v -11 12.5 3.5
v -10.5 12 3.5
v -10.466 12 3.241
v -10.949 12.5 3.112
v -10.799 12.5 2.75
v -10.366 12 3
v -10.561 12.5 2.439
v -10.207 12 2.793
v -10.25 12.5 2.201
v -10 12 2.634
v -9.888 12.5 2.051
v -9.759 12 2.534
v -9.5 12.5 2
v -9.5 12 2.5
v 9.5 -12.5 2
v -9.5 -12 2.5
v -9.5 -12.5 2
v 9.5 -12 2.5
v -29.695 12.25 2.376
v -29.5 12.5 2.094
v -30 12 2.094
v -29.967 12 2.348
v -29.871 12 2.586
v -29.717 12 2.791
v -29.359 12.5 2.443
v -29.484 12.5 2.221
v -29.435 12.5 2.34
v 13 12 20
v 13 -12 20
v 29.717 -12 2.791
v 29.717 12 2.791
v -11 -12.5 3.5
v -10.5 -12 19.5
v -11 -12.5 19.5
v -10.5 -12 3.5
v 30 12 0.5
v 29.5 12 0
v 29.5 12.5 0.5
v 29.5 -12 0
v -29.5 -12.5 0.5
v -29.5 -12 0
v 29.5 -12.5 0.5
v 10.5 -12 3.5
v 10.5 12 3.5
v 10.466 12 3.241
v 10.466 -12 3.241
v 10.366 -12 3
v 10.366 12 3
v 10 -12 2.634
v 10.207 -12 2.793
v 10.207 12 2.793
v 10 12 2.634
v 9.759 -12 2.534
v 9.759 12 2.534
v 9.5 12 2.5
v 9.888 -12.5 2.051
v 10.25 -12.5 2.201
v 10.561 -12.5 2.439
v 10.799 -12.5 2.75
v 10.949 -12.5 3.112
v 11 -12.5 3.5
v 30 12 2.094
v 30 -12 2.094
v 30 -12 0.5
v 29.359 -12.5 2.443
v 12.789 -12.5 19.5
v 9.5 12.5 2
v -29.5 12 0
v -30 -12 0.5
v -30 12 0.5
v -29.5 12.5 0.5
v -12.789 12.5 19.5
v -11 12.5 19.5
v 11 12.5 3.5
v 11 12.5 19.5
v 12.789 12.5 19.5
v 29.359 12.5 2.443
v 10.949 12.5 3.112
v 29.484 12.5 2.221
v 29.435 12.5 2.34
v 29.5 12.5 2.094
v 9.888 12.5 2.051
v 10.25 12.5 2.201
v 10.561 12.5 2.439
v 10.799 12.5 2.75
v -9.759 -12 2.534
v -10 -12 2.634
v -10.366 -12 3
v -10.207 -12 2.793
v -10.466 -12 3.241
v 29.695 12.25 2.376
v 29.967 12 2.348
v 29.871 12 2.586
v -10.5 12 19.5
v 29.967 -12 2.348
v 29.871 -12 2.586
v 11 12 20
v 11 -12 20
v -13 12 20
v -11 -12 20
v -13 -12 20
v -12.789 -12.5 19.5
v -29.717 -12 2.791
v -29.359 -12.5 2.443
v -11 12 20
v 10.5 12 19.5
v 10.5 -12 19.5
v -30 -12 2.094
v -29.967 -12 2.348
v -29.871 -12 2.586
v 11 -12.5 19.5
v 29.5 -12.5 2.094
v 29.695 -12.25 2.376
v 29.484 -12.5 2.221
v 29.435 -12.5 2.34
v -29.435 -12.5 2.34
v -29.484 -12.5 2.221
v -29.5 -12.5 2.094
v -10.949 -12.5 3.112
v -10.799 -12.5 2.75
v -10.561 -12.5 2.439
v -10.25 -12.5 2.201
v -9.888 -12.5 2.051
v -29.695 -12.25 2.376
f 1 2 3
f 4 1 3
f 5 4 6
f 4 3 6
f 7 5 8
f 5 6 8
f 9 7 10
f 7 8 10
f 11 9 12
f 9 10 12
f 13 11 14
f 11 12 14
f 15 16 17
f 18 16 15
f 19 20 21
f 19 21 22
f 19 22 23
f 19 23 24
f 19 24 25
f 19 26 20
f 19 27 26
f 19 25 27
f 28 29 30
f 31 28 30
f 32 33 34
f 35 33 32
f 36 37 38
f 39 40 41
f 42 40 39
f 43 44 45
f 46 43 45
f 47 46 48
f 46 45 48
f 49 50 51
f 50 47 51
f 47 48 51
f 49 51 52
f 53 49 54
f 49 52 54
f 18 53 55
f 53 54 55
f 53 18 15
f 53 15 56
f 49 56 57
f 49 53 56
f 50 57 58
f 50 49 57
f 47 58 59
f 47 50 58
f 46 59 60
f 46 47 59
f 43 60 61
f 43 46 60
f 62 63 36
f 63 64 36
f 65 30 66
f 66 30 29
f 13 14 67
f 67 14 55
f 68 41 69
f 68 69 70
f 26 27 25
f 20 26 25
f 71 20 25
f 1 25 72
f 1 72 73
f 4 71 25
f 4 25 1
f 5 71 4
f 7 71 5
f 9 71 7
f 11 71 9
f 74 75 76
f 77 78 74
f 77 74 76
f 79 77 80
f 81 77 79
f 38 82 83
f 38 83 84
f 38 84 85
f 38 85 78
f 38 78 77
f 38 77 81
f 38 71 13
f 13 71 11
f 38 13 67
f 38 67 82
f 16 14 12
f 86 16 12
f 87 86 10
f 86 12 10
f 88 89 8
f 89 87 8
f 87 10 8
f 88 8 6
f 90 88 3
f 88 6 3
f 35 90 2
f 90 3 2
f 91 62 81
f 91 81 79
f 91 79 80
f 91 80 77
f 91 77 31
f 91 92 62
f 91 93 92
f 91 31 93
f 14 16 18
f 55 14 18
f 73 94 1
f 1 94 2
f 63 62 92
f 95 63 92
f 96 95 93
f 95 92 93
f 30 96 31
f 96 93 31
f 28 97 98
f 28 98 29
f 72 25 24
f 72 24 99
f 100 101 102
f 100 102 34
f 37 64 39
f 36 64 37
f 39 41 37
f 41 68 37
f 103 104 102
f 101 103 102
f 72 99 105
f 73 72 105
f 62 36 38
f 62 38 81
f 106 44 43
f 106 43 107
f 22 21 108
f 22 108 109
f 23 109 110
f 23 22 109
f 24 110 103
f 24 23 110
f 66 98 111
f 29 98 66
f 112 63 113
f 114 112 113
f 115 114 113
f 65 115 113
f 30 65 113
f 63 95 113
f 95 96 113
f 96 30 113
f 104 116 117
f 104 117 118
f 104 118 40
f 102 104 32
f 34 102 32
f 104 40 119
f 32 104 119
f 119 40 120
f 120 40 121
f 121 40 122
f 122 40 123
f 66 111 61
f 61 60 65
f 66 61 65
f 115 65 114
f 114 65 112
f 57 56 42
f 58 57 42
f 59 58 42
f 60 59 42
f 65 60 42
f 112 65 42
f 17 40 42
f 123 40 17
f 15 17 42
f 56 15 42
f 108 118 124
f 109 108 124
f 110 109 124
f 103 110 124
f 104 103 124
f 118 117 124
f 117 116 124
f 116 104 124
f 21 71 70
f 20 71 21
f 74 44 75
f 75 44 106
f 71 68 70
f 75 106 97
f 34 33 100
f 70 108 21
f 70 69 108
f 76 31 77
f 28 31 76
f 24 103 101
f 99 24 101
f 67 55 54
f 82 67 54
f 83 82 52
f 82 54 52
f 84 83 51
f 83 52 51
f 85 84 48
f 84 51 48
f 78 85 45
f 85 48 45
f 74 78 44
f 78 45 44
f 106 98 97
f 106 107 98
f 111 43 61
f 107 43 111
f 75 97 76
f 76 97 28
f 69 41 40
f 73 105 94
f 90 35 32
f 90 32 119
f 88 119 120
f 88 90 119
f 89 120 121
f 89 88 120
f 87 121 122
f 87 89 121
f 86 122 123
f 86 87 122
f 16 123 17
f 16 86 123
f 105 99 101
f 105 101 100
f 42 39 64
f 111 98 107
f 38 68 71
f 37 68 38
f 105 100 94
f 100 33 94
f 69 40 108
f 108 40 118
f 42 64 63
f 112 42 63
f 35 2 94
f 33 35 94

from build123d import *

# Parameters (mm, degrees)
F0_W     = 60
F0_H     = 25
F1_DEPTH = 20
F2_W     = 21
F2_H     = 17.5
F3_DEPTH = 25.001
F4_R     = 1
F5_SIZE  = 0.5


with BuildPart() as f1:
    # F0 (on Top) → F1 (new body)
    with BuildSketch(Plane.XY):
        Rectangle(F0_W, F0_H)
    extrude(amount=F1_DEPTH)

    # F2 (on face) → F3 (cut, through all)
    with BuildSketch(Plane.XZ.offset(12.5)):
        with Locations((0, 11.25)):
            Rectangle(F2_W, F2_H)
        Polygon((-30, 2.5), (-13, 20), (-30, 20), align=None)
        Polygon((30, 2.5), (30, 20), (13, 20), align=None)
    extrude(amount=-F3_DEPTH, mode=Mode.SUBTRACT)

    # F4
    f4_edges = [f1.edges().sort_by_distance(p)[0] for p in [
        (-10.5, 0, 2.5),
        (10.5, 0, 2.5),
        (-30, 0, 2.5),
        (30, 0, 2.5),
    ]]
    fillet(f4_edges, radius=F4_R)

    # F5
    f5_edges = [f1.edges().sort_by_distance(p)[0] for p in [
        (0, -12.5, 0),
        (30, 0, 0),
        (0, 12.5, 0),
        (-30, 0, 0),
        (-10.5, 0, 20),
        (10.5, 0, 20),
        (30, -12.5, 1.047125),
        (29.926628, -12.5, 2.470229),
        (21.35864, -12.5, 11.395518),
        (-30, -12.5, 1.047125),
        (11.75, -12.5, 20),
        (-29.926628, -12.5, 2.470229),
        (10.5, -12.5, 11.75),
        (-21.35864, -12.5, 11.395518),
        (10.207107, -12.5, 2.792893),
        (-11.75, -12.5, 20),
        (0, -12.5, 2.5),
        (-10.5, -12.5, 11.75),
        (-10.207107, -12.5, 2.792893),
        (-30, 12.5, 1.047125),
        (-29.926628, 12.5, 2.470229),
        (-21.35864, 12.5, 11.395518),
        (30, 12.5, 1.047125),
        (-11.75, 12.5, 20),
        (29.926628, 12.5, 2.470229),
        (-10.5, 12.5, 11.75),
        (21.35864, 12.5, 11.395518),
        (-10.207107, 12.5, 2.792893),
        (11.75, 12.5, 20),
        (0, 12.5, 2.5),
        (10.5, 12.5, 11.75),
        (10.207107, 12.5, 2.792893),
    ]]
    chamfer(f5_edges, length=F5_SIZE)


solid = f1.part
